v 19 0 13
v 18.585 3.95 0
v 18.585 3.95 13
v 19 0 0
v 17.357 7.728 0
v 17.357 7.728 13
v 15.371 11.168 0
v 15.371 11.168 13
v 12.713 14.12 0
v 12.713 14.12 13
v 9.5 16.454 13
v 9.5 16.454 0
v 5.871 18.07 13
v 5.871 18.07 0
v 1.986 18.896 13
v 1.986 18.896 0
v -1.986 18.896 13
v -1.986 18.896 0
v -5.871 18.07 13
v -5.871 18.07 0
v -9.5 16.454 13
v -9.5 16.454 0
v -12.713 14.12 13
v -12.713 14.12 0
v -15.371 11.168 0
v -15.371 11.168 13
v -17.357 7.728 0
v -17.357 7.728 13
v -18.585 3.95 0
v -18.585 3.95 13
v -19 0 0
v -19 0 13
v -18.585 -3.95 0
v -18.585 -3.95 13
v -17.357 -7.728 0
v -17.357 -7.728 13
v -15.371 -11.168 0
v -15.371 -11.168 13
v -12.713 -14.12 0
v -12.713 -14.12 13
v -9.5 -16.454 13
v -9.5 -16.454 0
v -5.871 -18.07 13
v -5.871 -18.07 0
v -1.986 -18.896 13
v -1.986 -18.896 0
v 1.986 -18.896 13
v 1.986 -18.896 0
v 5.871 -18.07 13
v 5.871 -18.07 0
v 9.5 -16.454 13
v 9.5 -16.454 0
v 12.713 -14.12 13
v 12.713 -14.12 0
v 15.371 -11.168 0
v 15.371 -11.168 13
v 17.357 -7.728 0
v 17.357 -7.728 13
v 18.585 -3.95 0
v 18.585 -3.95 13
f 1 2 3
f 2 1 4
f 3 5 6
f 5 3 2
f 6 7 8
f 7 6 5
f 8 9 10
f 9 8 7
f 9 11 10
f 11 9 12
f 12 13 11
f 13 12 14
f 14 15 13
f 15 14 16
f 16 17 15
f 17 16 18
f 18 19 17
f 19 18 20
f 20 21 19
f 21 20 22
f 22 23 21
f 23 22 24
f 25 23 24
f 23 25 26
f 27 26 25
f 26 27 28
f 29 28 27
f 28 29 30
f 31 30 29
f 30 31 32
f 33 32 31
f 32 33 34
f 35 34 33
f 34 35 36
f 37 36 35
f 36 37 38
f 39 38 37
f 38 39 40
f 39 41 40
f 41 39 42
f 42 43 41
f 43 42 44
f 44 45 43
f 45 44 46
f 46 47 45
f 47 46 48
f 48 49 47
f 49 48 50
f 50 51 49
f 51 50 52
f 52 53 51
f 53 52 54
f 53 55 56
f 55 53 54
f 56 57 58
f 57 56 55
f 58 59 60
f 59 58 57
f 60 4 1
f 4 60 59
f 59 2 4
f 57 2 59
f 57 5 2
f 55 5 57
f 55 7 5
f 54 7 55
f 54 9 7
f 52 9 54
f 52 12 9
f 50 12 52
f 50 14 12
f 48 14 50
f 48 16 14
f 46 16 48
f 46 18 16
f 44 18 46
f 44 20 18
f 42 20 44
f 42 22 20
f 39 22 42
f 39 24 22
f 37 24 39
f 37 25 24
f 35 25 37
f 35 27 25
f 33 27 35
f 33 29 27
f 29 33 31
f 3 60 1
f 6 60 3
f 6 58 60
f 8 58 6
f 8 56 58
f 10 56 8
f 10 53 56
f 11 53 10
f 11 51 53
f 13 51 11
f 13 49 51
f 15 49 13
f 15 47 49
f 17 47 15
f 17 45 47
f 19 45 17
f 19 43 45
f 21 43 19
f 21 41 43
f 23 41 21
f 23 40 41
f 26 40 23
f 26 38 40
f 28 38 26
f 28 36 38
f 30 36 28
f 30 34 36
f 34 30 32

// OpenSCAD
// Generated by SolidPython 1.0.1 on 2020-07-29 00:46:44


cylinder(h = 13, r1 = 19, r2 = 19);
/***********************************************
*********      SolidPython code:      **********
************************************************
 
# import packages: SolidPython
from solid import *
from solid.utils import *
from itertools import chain, combinations, permutations


class Resize:

    def __init__(self, scad_file):
        self.scad_file = scad_file
        #self.scad_file = import_scad(scad_file)
        # cone/cylinder param:
        self.r1 = 0
        self.r2 = 0
        self.h = 0
        # rectangular prism param:
        self.w = 0
        self.l = 0
        # ellipse param:
        self.r = 0

    # import OpenScad code (file name corresponds to shape)


    # classify shape + parameters
    def assign(self, param1, param2, param3):
        if self.scad_file == 'cone.scad':
            self.r1 = param1
            self.r2 = param2
            self.h = param3
        elif self.scad_file == 'cylinder.scad':
            self.r1 = param1
            self.r2 = param2
            self.h = param3
        elif self.scad_file == 'rectangularPrism.scad':
            self.h = param1
            self.l = param2
            self.w = param3
        else:
            self.r = param1
            self.h = param2

    # resize parameters
    def iterate(self):
        x = range(3, 20, 2)
        i = 1
        if self.scad_file == 'cone.scad':
            tempList = list(permutations(x, 2))
            for temp in tempList:
                param1 = temp[0]
                param2 = temp[1]
                filepath = 'produced_scad_files/' + 'cone' + str(param1) + '_' + str(param2) + '_' + '.scad'
                scad_render_to_file(cylinder(h=param1, r1=param2, r2=0), filepath)

        elif self.scad_file == 'cylinder.scad':
            tempList = list(permutations(x, 3))
            for temp in tempList:
                param1 = temp[0]
                param2 = temp[1]
                filepath = 'produced_scad_files/' + 'cylinder' + str(param1) + '_' + str(param2) + '_' + '.scad'
                scad_render_to_file(cylinder(h=param1, r1=param2, r2=param2), filepath)

        elif self.scad_file == 'rectangularPrism.scad':
            tempList = list(permutations(x, 3))
            for temp in tempList:
                param1 = temp[0]
                param2 = temp[1]
                param3 = temp[2]
                filepath = 'produced_scad_files/' + 'rectangularPrism' + str(param1) + '_' + str(param2) + '_' + str(
                    param3) + '.scad'
                scad_render_to_file(cube(size=(param1, param2, param3)), filepath)

        elif self.scad_file == 'ellipse.scad':
            tempList = list(permutations(x, 4))
            for temp in tempList:
                param1 = temp[0]
                param2 = temp[1]
                param3 = temp[2]
                param4 = temp[3]
                filepath = 'produced_scad_files/' + 'ellipse' + str(param1) + '_' + str(param2) + '_' + str(param3) + '_' + str(param4) + '.scad'
                scad_render_to_file(scale([param1, param2, param3])(sphere(r=param4)), filepath)

    def render_to_scadfile(self):
        scad_render_to_file(scad, 'example.scad') 
 
************************************************/
